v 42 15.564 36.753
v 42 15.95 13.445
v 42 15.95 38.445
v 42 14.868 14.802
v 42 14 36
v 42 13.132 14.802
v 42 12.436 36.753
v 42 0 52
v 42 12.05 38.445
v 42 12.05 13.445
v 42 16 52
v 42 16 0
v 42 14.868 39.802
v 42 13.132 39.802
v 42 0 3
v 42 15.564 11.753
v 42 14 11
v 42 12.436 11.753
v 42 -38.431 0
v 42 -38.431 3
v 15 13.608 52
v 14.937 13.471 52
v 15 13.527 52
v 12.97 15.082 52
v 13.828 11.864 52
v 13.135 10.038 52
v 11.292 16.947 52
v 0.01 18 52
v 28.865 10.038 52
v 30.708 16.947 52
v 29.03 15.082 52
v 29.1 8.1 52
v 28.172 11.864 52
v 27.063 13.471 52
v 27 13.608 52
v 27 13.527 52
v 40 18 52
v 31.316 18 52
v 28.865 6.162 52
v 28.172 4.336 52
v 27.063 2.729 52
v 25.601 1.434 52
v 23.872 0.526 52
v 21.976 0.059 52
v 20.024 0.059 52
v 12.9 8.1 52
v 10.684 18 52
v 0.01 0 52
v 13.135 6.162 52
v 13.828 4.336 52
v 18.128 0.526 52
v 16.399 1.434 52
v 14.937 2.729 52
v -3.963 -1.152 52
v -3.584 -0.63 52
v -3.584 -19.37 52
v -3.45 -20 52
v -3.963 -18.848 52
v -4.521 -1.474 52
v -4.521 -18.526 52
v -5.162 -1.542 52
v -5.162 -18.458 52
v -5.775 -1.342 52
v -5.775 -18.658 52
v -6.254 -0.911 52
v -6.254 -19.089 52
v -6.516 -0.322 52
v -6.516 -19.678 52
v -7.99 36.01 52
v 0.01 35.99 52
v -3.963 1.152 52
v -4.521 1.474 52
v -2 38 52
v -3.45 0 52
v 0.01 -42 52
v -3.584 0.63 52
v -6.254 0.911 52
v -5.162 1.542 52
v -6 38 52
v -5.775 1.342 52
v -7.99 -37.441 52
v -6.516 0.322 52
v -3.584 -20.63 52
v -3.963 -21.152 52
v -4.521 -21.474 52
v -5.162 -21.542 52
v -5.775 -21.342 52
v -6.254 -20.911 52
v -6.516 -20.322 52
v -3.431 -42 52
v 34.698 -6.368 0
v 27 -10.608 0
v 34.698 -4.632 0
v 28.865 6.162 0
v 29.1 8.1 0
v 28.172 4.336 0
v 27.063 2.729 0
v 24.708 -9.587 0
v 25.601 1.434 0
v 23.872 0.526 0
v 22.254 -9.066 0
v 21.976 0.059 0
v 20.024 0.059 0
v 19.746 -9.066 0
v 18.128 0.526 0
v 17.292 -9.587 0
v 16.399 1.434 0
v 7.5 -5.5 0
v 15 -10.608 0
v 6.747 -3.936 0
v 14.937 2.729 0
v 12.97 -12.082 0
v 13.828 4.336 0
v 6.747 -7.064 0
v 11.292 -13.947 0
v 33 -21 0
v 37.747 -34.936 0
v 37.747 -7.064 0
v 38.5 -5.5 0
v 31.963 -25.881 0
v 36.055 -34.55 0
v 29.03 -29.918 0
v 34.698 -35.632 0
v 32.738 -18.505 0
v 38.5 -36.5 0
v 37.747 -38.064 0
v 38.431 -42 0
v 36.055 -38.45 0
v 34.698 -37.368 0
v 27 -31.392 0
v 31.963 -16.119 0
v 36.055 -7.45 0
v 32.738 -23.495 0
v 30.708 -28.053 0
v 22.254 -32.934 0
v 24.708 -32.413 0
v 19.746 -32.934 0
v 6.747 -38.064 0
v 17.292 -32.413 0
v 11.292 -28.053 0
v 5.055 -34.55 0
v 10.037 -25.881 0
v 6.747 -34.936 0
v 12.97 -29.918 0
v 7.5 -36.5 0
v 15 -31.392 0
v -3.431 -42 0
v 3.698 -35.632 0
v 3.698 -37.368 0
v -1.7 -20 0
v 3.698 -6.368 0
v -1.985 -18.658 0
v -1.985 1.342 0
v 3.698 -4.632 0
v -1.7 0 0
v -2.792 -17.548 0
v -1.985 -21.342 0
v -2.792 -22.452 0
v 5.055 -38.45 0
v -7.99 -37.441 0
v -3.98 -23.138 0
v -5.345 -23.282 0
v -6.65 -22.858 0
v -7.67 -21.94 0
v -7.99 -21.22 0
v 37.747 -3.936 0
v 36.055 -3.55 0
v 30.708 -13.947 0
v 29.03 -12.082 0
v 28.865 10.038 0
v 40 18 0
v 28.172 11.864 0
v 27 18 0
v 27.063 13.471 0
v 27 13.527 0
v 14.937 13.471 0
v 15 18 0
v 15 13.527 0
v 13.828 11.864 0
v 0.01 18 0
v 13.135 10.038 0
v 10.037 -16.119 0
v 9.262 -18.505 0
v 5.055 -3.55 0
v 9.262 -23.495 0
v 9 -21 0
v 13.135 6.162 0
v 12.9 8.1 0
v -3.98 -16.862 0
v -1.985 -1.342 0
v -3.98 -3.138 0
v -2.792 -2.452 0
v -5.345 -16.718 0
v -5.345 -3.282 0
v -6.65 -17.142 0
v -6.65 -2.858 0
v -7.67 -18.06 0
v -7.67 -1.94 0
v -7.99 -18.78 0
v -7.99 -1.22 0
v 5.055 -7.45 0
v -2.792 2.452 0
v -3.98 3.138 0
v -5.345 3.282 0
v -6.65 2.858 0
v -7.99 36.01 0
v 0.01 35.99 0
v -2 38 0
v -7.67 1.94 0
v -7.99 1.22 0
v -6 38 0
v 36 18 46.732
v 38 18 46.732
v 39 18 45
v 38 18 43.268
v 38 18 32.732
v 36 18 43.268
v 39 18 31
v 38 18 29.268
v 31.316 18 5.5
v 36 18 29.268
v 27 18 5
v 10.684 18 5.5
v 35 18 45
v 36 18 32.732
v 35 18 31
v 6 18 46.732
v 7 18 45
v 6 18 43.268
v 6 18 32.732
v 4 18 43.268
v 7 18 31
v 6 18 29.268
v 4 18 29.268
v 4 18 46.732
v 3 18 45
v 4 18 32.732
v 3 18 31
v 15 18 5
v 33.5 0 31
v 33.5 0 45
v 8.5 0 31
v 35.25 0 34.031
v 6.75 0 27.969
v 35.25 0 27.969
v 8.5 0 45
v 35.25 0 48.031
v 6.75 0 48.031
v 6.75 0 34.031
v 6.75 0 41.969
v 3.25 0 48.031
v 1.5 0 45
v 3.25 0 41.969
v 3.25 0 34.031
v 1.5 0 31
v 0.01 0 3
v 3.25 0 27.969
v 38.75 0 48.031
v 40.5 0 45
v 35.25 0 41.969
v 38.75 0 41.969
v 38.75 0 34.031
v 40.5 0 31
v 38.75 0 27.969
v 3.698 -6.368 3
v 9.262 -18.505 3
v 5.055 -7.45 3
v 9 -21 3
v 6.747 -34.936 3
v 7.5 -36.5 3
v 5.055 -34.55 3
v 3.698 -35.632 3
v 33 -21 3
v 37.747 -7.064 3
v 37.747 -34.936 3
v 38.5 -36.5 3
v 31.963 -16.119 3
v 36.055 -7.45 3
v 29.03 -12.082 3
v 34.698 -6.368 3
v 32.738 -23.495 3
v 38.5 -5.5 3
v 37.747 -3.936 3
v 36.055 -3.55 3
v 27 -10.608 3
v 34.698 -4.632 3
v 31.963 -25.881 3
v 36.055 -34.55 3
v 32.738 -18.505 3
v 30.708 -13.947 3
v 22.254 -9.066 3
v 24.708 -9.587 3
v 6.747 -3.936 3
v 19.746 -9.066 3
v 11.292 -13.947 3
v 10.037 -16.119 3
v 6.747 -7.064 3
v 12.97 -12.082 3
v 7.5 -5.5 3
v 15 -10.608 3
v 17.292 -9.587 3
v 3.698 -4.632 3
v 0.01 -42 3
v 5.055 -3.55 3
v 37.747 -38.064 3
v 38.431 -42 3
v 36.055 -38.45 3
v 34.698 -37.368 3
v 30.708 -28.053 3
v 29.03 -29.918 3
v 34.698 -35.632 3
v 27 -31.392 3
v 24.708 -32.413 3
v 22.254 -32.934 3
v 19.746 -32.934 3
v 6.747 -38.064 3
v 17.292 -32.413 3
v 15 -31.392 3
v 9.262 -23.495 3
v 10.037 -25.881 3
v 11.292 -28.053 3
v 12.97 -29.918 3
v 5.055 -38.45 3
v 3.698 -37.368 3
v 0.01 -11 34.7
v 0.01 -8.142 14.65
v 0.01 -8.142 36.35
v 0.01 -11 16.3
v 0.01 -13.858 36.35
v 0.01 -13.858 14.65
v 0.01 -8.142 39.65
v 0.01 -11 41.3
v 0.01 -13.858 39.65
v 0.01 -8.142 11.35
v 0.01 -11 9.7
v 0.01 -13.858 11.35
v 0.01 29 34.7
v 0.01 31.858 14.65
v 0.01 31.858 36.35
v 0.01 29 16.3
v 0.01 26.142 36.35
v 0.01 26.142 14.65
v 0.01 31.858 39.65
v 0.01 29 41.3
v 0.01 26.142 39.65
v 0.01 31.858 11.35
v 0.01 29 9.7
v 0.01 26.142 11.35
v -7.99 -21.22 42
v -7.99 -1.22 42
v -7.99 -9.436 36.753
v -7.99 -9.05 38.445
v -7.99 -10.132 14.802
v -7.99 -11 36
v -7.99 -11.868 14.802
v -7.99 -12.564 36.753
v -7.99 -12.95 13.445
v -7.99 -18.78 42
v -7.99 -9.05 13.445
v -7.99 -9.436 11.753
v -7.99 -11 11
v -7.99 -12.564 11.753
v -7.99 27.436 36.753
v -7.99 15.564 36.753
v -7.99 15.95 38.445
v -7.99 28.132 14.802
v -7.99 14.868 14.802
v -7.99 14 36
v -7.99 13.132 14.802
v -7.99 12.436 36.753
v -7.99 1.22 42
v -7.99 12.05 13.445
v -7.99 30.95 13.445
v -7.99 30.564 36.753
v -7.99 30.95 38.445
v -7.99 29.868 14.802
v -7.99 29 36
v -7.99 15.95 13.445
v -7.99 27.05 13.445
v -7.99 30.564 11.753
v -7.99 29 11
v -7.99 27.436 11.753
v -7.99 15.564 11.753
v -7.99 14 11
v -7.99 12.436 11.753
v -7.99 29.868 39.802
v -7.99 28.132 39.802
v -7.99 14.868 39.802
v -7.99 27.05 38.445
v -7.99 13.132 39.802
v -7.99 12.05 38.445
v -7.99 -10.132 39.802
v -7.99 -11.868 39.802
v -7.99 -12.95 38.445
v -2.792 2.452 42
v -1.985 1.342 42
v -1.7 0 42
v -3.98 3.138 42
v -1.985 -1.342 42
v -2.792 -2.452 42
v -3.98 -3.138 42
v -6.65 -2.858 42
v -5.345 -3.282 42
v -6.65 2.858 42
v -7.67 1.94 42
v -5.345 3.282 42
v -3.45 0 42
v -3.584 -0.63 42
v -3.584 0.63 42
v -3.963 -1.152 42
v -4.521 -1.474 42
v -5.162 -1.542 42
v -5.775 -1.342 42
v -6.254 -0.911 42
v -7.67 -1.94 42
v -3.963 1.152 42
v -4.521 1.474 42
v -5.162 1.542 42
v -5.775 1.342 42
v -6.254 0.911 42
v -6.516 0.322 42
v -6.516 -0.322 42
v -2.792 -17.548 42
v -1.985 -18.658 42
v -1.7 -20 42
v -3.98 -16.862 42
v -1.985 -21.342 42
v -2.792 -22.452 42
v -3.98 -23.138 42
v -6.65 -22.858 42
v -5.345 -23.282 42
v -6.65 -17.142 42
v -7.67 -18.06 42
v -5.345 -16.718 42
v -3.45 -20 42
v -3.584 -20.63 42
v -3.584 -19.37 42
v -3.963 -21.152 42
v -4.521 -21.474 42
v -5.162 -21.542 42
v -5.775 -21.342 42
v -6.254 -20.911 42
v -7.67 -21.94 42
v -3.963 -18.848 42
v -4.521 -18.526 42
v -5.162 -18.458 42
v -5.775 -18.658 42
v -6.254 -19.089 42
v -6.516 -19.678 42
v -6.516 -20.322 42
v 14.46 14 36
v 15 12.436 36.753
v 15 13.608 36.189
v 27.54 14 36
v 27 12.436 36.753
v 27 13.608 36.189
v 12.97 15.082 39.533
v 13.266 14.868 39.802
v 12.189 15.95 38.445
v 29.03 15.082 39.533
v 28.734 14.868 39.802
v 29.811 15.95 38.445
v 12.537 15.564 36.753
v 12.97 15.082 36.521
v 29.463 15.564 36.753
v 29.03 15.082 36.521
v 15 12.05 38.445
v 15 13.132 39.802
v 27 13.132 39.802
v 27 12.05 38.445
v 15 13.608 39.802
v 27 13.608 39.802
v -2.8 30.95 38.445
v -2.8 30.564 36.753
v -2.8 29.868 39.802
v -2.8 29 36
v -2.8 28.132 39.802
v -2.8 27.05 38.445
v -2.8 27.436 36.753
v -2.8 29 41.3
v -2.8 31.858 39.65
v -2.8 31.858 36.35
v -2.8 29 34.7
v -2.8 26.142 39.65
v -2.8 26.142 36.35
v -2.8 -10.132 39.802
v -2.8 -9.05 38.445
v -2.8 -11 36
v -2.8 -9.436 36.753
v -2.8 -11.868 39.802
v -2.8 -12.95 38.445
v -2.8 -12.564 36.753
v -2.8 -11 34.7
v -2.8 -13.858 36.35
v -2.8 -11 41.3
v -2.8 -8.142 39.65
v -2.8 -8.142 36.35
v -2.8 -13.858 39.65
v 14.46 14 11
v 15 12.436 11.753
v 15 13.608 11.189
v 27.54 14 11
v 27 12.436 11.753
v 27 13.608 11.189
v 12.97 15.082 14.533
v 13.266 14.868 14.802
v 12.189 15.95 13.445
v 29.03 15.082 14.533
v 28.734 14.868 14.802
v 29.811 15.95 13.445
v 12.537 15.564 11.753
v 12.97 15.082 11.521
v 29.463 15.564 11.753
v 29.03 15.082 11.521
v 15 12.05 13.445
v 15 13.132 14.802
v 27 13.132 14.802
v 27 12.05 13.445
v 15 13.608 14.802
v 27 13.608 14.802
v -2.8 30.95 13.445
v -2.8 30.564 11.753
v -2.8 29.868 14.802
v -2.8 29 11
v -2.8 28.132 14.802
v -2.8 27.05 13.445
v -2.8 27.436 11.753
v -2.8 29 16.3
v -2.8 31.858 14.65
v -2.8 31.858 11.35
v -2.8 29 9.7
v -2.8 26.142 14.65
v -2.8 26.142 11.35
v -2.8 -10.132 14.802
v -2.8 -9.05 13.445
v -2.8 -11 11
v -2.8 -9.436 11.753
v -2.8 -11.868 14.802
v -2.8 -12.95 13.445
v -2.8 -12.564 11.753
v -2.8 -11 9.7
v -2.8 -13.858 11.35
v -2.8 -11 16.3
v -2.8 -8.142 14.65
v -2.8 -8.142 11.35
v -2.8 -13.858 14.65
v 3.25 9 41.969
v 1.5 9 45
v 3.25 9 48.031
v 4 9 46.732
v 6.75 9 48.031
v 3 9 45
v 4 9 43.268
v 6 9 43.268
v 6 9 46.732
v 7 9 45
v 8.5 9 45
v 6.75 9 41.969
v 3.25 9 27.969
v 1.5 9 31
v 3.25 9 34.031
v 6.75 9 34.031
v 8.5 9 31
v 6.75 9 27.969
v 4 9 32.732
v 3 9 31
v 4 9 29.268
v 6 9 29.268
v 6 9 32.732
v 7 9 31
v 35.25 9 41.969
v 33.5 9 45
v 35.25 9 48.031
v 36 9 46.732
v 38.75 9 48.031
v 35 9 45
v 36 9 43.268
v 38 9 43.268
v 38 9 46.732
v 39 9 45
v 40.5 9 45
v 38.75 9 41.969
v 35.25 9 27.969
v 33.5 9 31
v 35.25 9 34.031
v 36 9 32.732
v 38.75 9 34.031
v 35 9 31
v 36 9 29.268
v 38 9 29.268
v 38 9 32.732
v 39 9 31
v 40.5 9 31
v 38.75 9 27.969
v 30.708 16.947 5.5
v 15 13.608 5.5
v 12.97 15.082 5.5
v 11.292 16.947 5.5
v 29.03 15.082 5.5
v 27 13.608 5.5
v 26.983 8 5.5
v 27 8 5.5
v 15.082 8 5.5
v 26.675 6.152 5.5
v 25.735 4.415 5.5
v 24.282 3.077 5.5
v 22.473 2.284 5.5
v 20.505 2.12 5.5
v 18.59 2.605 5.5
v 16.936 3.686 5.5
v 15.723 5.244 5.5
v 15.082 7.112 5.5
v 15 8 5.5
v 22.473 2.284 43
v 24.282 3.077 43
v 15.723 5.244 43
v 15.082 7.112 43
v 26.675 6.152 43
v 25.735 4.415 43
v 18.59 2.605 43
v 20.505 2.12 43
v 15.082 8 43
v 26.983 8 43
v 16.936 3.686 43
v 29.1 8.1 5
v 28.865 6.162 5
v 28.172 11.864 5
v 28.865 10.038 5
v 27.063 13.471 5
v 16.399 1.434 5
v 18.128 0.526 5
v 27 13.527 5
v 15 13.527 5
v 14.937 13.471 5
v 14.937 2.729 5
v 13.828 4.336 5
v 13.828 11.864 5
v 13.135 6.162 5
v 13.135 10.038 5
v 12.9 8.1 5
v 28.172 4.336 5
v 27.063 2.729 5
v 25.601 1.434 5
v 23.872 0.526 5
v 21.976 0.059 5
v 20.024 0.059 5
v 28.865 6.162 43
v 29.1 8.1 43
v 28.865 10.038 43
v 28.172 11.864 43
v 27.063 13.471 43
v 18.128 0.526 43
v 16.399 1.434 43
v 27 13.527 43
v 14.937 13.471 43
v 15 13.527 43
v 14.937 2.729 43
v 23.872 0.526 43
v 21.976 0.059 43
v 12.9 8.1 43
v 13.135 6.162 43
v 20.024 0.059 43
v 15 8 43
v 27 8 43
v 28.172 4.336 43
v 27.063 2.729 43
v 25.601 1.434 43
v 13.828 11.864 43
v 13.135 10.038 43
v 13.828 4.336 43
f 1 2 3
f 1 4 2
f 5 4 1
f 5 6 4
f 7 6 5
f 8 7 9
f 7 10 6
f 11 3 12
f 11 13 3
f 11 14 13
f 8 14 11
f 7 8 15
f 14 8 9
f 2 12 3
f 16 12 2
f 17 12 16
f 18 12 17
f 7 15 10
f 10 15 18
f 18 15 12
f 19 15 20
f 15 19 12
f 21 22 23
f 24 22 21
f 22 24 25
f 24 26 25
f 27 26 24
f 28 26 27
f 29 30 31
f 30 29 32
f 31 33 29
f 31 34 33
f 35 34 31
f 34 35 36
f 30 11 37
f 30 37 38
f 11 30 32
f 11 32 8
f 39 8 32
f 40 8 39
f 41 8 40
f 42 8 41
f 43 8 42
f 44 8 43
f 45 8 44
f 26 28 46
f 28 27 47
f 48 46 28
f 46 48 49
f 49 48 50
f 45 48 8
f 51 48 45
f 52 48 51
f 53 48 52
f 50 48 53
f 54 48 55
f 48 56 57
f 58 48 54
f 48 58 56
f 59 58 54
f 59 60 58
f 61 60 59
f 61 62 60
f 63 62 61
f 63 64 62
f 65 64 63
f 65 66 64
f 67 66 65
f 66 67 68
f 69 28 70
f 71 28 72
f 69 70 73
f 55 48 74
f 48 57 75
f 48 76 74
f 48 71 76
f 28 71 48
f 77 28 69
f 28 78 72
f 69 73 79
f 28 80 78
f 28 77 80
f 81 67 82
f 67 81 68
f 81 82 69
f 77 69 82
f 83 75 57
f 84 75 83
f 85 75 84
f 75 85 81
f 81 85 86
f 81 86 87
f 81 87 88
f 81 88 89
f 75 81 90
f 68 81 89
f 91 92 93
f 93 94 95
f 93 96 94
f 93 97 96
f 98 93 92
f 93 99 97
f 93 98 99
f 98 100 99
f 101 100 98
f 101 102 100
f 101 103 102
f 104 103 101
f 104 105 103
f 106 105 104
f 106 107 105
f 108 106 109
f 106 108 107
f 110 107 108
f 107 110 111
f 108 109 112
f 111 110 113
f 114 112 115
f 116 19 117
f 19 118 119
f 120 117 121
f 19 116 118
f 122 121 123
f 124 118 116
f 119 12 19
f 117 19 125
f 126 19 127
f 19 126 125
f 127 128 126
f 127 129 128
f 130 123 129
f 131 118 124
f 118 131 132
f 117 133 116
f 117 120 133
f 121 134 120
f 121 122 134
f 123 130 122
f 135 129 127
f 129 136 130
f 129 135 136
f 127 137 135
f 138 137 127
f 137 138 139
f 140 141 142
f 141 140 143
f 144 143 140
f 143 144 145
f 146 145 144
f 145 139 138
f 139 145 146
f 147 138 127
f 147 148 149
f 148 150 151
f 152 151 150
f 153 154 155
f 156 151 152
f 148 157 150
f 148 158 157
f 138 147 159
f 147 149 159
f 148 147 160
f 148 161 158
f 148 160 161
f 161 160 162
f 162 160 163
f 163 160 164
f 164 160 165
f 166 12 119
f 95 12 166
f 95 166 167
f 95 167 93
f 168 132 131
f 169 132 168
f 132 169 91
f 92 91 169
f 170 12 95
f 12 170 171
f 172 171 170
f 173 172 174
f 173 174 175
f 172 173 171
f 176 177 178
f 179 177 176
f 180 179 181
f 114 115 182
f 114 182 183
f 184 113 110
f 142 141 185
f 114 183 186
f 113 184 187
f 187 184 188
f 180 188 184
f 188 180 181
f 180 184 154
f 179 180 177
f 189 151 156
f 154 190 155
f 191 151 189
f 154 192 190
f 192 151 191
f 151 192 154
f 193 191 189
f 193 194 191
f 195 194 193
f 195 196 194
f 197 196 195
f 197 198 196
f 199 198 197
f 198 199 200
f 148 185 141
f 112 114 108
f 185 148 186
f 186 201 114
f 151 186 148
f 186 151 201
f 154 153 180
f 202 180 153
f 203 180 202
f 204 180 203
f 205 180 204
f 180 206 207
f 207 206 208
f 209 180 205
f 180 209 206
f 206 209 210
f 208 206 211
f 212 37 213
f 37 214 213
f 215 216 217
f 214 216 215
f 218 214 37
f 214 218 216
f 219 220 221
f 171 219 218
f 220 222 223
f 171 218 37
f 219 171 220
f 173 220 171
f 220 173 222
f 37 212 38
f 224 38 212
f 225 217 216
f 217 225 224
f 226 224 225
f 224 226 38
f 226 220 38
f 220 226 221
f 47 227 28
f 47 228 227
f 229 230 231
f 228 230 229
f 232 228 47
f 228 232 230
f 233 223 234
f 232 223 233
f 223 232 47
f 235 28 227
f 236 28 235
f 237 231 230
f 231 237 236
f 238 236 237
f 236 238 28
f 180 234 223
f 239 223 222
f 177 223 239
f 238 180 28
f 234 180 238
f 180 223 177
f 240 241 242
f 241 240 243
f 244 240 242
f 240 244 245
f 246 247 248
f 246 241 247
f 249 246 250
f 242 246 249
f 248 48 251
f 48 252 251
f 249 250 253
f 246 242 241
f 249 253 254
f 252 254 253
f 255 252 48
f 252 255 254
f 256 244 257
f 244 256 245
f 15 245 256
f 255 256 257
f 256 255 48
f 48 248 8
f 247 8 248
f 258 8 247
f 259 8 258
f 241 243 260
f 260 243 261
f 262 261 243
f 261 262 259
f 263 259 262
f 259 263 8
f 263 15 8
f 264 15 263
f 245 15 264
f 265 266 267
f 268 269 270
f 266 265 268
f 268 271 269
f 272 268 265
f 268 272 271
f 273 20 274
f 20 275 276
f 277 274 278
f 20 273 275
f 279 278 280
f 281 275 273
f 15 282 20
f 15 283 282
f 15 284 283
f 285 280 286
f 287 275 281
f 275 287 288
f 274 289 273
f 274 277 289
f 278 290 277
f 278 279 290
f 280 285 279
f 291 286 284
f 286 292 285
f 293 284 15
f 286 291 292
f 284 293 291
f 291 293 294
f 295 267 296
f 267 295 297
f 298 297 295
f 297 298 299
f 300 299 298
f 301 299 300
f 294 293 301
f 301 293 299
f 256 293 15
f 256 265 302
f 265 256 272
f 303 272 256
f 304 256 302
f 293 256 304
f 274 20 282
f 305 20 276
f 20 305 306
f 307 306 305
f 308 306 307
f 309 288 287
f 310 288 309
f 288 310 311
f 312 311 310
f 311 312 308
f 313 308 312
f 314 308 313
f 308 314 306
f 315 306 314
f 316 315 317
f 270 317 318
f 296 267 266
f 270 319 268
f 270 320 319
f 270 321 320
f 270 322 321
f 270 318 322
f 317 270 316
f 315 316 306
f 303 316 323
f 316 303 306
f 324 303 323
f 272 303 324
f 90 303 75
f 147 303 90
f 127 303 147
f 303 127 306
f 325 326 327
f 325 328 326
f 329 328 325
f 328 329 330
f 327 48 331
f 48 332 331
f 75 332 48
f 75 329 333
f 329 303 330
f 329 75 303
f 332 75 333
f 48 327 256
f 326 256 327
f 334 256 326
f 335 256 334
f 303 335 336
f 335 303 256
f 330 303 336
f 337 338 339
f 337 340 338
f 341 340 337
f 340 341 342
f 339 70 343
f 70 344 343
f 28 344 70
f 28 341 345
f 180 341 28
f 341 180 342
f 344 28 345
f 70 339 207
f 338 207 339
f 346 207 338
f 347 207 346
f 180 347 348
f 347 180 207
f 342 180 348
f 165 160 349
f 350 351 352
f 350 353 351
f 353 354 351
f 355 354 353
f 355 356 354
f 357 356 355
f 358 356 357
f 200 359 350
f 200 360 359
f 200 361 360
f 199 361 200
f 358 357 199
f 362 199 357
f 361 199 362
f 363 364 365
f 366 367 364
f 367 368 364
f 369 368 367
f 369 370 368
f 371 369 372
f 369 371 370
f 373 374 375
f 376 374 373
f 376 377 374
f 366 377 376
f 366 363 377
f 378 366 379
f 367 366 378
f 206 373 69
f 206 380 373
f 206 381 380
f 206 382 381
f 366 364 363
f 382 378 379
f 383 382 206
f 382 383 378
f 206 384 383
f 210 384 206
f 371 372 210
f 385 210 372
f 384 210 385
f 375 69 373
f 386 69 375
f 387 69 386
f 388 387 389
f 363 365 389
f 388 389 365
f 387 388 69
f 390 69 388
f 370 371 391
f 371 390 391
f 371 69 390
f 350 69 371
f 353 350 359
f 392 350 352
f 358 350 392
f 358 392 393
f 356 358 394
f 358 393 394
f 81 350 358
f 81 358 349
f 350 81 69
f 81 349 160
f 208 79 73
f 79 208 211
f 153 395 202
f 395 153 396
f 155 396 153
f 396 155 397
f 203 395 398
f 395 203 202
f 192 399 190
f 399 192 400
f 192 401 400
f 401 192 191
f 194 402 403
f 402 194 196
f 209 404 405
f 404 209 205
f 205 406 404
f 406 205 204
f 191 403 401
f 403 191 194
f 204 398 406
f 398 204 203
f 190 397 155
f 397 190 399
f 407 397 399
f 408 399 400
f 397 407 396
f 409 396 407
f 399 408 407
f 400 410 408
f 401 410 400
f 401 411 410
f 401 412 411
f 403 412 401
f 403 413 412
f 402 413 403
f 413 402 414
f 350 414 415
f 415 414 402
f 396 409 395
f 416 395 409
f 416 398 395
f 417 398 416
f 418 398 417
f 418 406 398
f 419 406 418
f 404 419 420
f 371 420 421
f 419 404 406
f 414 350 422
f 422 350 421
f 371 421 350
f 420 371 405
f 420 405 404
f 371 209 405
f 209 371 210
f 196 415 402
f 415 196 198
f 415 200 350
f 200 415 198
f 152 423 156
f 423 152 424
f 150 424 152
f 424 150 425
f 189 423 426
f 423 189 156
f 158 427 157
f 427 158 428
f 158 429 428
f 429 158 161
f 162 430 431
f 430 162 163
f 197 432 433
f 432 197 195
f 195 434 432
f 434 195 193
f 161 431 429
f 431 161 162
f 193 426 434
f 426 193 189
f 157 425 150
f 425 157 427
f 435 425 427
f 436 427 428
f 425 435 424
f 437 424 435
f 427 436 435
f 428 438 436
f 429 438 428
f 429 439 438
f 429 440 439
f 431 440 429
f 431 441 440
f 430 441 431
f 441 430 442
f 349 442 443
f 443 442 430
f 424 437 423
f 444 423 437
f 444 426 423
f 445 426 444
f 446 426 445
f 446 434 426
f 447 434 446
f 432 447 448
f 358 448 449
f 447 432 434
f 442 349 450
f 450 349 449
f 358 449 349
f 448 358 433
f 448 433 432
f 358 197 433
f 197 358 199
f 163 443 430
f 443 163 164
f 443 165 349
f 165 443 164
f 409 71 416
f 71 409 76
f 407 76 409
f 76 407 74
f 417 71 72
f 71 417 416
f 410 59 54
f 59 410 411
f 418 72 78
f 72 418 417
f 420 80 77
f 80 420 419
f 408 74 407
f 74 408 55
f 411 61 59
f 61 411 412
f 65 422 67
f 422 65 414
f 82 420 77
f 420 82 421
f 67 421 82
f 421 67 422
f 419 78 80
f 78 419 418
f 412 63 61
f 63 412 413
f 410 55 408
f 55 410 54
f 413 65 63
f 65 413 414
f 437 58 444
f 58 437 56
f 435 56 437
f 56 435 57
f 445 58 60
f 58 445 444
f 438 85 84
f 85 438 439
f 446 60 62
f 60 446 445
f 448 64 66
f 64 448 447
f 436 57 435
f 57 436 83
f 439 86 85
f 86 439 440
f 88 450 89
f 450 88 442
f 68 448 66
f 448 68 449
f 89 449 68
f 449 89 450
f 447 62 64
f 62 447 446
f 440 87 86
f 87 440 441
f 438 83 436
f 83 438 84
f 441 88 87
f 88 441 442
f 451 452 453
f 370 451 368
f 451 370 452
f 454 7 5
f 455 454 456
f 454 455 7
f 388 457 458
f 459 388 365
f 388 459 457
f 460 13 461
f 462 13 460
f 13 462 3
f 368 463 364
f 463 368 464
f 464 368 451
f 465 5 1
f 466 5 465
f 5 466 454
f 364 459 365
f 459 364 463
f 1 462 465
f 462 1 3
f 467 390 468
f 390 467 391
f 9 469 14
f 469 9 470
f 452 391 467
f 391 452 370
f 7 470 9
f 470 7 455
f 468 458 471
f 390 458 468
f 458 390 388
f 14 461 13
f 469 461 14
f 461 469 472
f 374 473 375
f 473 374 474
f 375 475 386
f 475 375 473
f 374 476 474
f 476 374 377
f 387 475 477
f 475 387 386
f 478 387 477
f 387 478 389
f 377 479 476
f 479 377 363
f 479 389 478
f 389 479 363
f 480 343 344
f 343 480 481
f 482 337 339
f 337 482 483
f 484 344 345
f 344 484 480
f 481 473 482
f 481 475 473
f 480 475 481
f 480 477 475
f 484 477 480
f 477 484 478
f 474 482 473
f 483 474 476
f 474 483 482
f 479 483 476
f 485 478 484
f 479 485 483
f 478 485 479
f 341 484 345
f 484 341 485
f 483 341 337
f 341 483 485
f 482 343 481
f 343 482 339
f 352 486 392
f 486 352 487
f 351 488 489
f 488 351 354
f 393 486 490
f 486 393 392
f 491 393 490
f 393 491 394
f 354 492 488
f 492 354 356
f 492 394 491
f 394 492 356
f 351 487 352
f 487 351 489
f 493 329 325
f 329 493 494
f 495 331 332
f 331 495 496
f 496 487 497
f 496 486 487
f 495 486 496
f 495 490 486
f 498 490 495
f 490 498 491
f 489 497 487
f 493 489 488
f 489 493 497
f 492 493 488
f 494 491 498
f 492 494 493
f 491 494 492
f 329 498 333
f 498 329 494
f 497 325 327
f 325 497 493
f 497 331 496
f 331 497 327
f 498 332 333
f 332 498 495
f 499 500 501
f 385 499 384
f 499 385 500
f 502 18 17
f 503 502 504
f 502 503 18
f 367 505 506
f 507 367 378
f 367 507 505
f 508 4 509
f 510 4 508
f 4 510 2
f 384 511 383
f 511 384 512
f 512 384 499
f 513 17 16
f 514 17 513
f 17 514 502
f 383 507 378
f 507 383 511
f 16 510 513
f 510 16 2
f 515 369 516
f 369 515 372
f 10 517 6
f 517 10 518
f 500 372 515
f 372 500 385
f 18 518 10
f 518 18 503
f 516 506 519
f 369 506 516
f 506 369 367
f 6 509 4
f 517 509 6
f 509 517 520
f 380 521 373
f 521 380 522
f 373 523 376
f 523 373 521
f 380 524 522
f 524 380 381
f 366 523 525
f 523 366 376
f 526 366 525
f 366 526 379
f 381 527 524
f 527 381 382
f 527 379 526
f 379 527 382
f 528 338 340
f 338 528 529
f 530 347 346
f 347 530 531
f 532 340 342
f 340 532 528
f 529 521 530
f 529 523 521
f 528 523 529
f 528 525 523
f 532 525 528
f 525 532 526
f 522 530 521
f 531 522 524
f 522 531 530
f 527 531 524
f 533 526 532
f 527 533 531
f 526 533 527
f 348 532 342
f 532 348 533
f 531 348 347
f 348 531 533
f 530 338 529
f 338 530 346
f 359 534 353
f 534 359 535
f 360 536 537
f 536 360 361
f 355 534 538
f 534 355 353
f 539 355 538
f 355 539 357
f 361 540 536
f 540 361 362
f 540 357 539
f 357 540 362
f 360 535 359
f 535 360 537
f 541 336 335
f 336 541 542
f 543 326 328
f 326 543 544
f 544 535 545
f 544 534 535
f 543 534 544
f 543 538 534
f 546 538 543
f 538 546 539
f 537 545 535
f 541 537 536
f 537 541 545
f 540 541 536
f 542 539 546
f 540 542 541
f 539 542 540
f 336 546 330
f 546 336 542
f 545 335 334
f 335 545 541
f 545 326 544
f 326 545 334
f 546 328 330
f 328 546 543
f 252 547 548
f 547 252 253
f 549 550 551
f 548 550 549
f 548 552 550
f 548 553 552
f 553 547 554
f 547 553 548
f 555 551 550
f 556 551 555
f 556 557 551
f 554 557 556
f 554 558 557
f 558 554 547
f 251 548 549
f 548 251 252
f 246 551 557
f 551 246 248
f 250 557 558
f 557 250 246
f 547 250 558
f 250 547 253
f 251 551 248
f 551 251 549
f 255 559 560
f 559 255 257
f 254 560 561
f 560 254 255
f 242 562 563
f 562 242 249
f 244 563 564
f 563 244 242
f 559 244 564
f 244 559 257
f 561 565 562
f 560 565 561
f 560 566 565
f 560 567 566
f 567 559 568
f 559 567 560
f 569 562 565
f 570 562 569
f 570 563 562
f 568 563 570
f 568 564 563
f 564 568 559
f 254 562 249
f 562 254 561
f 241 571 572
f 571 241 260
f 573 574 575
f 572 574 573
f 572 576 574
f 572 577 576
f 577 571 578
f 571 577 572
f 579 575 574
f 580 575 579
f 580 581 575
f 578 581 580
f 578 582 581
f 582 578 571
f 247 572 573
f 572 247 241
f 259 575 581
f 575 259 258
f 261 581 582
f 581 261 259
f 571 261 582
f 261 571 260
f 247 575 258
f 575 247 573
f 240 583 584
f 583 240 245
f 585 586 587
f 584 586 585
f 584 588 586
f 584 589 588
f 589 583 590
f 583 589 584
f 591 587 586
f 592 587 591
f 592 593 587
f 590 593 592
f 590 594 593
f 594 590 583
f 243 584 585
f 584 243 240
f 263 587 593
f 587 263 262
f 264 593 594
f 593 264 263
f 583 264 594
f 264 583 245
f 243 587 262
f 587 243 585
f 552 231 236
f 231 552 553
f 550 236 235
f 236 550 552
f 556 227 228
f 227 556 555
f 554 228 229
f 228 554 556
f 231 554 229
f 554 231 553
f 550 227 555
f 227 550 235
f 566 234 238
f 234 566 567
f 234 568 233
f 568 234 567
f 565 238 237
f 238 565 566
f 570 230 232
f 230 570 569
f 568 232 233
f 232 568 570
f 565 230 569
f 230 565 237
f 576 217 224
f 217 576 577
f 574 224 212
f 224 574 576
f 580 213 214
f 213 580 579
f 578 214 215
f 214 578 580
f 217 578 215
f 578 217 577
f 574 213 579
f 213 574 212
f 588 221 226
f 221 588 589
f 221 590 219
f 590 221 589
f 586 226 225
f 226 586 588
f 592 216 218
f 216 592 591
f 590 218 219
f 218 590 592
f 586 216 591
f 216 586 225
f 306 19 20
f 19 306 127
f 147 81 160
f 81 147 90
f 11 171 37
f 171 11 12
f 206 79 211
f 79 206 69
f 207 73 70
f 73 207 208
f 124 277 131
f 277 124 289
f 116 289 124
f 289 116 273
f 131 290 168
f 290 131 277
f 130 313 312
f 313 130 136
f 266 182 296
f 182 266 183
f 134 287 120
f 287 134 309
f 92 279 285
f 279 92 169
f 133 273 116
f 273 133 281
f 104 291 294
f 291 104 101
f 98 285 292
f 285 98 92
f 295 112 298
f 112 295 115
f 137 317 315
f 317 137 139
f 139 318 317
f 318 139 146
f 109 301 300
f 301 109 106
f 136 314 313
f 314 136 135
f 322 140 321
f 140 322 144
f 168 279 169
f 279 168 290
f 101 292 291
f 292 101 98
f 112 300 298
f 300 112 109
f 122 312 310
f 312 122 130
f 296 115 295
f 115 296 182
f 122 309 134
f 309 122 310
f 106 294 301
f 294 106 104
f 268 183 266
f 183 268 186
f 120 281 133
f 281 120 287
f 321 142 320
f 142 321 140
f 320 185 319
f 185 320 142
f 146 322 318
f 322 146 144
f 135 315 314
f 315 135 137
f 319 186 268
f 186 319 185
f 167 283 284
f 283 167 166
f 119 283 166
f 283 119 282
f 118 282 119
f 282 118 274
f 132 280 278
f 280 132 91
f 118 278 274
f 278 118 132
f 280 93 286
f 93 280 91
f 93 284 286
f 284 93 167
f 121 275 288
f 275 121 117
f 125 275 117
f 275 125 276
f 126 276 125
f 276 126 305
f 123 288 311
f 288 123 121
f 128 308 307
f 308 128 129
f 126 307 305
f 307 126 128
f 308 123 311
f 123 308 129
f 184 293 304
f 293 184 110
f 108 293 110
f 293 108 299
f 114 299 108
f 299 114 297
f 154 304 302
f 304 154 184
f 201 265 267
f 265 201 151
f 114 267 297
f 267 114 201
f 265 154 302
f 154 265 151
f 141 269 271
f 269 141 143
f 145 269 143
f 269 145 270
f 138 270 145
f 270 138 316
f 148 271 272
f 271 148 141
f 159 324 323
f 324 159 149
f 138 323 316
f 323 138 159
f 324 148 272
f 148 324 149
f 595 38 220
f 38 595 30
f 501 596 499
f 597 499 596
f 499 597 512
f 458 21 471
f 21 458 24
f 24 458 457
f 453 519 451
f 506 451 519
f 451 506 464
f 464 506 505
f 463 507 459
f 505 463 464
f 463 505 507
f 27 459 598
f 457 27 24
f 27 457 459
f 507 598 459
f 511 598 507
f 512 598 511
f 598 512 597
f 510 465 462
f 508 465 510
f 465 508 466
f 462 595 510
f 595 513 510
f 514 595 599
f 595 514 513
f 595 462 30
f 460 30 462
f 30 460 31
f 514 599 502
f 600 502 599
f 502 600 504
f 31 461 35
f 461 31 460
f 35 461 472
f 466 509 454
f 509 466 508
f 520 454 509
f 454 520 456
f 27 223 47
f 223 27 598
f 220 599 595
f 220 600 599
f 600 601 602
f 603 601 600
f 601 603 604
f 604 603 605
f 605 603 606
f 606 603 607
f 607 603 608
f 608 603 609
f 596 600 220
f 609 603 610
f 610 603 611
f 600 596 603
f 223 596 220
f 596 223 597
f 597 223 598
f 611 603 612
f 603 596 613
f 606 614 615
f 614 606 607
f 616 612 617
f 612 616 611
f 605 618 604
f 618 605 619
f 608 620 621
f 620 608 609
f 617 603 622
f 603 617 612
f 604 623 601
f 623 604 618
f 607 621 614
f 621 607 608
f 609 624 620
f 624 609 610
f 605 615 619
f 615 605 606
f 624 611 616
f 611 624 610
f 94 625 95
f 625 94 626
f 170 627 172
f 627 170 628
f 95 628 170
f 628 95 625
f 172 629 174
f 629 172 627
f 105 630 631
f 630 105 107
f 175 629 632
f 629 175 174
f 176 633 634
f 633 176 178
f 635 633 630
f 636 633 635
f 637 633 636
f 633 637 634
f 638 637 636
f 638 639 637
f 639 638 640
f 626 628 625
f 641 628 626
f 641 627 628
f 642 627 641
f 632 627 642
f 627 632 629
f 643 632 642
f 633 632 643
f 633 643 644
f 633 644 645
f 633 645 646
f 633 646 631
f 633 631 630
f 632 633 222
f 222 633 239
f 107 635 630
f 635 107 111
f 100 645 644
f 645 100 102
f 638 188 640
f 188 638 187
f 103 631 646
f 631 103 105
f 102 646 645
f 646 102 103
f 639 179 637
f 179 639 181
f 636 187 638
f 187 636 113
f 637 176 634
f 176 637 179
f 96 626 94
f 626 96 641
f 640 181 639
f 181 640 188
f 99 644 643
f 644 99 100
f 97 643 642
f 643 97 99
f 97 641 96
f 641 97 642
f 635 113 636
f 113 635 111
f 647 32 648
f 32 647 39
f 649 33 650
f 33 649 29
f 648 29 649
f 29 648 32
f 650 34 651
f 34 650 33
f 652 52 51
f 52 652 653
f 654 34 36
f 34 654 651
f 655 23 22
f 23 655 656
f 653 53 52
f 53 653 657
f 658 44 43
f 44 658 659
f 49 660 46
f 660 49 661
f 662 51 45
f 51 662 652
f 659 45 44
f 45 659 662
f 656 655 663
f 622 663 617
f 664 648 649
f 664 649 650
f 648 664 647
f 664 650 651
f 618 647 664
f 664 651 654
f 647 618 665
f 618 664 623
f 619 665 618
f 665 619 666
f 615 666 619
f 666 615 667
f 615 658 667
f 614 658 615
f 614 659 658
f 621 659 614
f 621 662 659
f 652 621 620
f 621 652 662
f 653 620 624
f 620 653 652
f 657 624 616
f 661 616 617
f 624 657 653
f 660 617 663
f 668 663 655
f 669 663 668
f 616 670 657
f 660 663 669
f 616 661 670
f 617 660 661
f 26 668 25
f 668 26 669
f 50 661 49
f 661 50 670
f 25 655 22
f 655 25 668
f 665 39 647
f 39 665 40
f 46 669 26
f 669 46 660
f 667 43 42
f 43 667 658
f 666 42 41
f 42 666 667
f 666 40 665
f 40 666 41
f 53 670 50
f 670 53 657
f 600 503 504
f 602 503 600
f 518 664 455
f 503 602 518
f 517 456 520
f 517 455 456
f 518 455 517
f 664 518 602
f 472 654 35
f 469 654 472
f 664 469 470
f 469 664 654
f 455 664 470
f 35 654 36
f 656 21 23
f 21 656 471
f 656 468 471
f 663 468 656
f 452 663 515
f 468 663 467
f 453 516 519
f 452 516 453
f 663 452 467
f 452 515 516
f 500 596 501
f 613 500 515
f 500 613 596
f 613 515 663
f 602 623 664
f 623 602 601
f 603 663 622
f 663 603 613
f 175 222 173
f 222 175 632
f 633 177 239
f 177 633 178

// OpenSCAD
/*
bearing diameter 16mm


*/

module nozzlemount(){
rotate([0,90,0]) cylinder(r=2, h=70);
translate([0,15,0]) rotate([0,90,0]) cylinder(r=2, h=70);
translate([10-2.8,15,0]) rotate([0,90,0]) cylinder(r=3.3, h=70,$fn=6);
translate([0,-25,0]) rotate([0,90,0]) cylinder(r=2, h=70);
translate([10-2.8,-25,0]) rotate([0,90,0]) cylinder(r=3.3, h=70,$fn=6);
}


difference(){
union(){
cube([42,18,52]);
translate([0,-42,0]) cube([42,42+3,3]);
translate([-7.99,-42,0])cube([8,80,52]);
}

//antiwarpagenation

translate([46,-91,-1])rotate([0,0,45])cube(40);
translate([-11,-91,-1])rotate([0,0,45])cube([40,40,60]);
translate([46,12,-1])rotate([0,0,45])cube([40,40,60]);
translate([-32,12,-1])rotate([0,0,45])cube([40,40,60]);
translate([4,32,-1])rotate([0,0,45])cube([40,40,60]);

// motor circle cut
translate([21,-21,-1]) cylinder(r=12, h=5);

translate([21+15.5,-21+15.5,-1]) cylinder(r=2, h=5);
translate([21+15.5,-21-15.5,-1]) cylinder(r=2, h=5);
translate([21-15.5,-21+15.5,-1]) cylinder(r=2, h=5);
translate([21-15.5,-21-15.5,-1]) cylinder(r=2, h=5);




// idler bearing cutout

translate([21,24,5.5]) cylinder(r=12, h=60);



translate([21,8.1,5.5]) cylinder(r=6, h=52);
translate([21,8.1,-1]) cylinder(r=8.1, h=6);
translate([21,8.1,-5+52-4]) cylinder(r=8.1, h=10);
translate([-6+21,8,5.5]) cube([12,12,50]);

translate([-6+21,8,-50+5]) cube([12,12,50]);

//mounting to carriage
translate([-5,0,-28]){
translate([0,0,0])rotate([0,0,0])cylinder(r=3.3, h=70, $fn=15);
translate([0,0-20,0])rotate([0,0,0])cylinder(r=3.3, h=70, $fn=15);
translate([0,0,30])rotate([0,0,0])cylinder(r=3.1/2, h=70, $fn=15);
translate([0,0-20,30])rotate([0,0,0])cylinder(r=3.1/2, h=70, $fn=15);
}

// idler nuts and filament channels

translate([0,0,-2]){
translate([-10,2+8+4,52-12]) nozzlemount();
translate([-10,2+8+4,52-12-25]) nozzlemount();

translate([5,-1,52-12+7]) rotate([0,90,90]) rotate([0,0,30]) cylinder(r=3.5, h=10, $fn=6);

translate([5,-1,52-12-7]) rotate([0,90,90]) rotate([0,0,30]) cylinder(r=3.5, h=10, $fn=6);

translate([5+32,-1,52-12+7]) rotate([0,90,90]) rotate([0,0,30]) cylinder(r=3.5, h=10, $fn=6);

translate([5+32,-1,52-12-7]) rotate([0,90,90]) rotate([0,0,30]) cylinder(r=3.5, h=10, $fn=6);


translate([5,-1,52-12+7]) rotate([0,90,90]) rotate([0,0,30]) cylinder(r=2, h=40, $fn=6);

translate([5,-1,52-12-7]) rotate([0,90,90]) rotate([0,0,30]) cylinder(r=2, h=40, $fn=6);

translate([5+32,-1,52-12+7]) rotate([0,90,90]) rotate([0,0,30]) cylinder(r=2, h=40, $fn=6);
translate([5+32,-1,52-12-7]) rotate([0,90,90]) rotate([0,0,30]) cylinder(r=2, h=40, $fn=6);
}
}
